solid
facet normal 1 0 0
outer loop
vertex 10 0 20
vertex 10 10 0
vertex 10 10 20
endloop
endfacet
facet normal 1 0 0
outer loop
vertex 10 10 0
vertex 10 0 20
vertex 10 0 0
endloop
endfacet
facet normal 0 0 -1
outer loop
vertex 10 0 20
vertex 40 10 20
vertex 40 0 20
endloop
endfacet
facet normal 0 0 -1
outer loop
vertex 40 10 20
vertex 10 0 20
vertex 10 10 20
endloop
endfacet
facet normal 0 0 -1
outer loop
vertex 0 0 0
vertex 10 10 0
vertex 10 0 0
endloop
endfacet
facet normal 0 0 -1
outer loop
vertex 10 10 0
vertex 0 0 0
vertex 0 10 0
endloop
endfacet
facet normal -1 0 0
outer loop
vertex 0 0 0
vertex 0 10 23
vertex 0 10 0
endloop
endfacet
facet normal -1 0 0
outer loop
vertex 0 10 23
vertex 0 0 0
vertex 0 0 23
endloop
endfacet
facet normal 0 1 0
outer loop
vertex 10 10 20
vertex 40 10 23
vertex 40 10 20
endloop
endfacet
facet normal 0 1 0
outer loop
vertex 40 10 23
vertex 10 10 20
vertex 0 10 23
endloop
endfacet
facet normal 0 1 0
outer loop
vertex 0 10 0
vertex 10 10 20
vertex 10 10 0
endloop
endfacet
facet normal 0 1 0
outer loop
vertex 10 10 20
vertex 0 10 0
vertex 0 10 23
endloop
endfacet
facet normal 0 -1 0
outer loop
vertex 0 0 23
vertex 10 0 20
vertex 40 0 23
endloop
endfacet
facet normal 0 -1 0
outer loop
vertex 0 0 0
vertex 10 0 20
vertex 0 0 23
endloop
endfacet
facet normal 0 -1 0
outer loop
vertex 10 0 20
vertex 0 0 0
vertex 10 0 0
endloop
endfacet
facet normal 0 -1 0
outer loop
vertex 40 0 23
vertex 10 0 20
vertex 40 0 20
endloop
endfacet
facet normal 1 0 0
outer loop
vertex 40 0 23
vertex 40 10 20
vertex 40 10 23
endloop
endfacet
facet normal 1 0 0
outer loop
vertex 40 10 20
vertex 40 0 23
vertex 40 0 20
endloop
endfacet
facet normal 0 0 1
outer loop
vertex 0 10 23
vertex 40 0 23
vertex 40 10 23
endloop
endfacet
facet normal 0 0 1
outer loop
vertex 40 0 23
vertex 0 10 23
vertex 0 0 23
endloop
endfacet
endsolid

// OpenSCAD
// TEMOIN DE LA GARDE 8 -- cette piece DOIT echouer.
//
// Une etagere de 30 mm en porte-a-faux horizontal, a 20 mm du plateau :
// impossible a imprimer sans supports, et personne n'en doute.
//
// Elle existe parce qu'une garde qui n'a jamais echoue ne garde rien. Trois
// formulations de la garde 8 ont ete essayees avant celle-ci, et les trois
// laissaient passer cette etagere :
//
//   - "aucun support genere" : circulaire, le profil a support_material = 0 ;
//   - "l'auto-detecteur n'en reclame aucun" : trop severe en sens inverse ;
//   - "tout porte-a-faux est ponte" : PrusaSlicer ponte a peu pres tout.
//
// La formulation retenue -- la PART de support rapportee au poids de la
// piece -- la rejette a 31 %, quand la cale est a 1,7 %. C'est ce temoin qui
// a permis de le savoir, et c'est pour ca qu'il est versionne et rejoue a
// chaque `make slice` plutot que griffonne dans build/.
//
// La masse absolue ne discriminerait rien : ce temoin, minuscule, demande
// MOINS de support que la cale (1,9 g contre 3,2 g).

pied_x   = 10;
pied_y   = 10;
pied_h   = 20;
etagere  = 30;   // porte-a-faux horizontal pur
ep       = 3;

cube([pied_x, pied_y, pied_h]);
translate([0, 0, pied_h]) cube([pied_x + etagere, pied_y, ep]);
